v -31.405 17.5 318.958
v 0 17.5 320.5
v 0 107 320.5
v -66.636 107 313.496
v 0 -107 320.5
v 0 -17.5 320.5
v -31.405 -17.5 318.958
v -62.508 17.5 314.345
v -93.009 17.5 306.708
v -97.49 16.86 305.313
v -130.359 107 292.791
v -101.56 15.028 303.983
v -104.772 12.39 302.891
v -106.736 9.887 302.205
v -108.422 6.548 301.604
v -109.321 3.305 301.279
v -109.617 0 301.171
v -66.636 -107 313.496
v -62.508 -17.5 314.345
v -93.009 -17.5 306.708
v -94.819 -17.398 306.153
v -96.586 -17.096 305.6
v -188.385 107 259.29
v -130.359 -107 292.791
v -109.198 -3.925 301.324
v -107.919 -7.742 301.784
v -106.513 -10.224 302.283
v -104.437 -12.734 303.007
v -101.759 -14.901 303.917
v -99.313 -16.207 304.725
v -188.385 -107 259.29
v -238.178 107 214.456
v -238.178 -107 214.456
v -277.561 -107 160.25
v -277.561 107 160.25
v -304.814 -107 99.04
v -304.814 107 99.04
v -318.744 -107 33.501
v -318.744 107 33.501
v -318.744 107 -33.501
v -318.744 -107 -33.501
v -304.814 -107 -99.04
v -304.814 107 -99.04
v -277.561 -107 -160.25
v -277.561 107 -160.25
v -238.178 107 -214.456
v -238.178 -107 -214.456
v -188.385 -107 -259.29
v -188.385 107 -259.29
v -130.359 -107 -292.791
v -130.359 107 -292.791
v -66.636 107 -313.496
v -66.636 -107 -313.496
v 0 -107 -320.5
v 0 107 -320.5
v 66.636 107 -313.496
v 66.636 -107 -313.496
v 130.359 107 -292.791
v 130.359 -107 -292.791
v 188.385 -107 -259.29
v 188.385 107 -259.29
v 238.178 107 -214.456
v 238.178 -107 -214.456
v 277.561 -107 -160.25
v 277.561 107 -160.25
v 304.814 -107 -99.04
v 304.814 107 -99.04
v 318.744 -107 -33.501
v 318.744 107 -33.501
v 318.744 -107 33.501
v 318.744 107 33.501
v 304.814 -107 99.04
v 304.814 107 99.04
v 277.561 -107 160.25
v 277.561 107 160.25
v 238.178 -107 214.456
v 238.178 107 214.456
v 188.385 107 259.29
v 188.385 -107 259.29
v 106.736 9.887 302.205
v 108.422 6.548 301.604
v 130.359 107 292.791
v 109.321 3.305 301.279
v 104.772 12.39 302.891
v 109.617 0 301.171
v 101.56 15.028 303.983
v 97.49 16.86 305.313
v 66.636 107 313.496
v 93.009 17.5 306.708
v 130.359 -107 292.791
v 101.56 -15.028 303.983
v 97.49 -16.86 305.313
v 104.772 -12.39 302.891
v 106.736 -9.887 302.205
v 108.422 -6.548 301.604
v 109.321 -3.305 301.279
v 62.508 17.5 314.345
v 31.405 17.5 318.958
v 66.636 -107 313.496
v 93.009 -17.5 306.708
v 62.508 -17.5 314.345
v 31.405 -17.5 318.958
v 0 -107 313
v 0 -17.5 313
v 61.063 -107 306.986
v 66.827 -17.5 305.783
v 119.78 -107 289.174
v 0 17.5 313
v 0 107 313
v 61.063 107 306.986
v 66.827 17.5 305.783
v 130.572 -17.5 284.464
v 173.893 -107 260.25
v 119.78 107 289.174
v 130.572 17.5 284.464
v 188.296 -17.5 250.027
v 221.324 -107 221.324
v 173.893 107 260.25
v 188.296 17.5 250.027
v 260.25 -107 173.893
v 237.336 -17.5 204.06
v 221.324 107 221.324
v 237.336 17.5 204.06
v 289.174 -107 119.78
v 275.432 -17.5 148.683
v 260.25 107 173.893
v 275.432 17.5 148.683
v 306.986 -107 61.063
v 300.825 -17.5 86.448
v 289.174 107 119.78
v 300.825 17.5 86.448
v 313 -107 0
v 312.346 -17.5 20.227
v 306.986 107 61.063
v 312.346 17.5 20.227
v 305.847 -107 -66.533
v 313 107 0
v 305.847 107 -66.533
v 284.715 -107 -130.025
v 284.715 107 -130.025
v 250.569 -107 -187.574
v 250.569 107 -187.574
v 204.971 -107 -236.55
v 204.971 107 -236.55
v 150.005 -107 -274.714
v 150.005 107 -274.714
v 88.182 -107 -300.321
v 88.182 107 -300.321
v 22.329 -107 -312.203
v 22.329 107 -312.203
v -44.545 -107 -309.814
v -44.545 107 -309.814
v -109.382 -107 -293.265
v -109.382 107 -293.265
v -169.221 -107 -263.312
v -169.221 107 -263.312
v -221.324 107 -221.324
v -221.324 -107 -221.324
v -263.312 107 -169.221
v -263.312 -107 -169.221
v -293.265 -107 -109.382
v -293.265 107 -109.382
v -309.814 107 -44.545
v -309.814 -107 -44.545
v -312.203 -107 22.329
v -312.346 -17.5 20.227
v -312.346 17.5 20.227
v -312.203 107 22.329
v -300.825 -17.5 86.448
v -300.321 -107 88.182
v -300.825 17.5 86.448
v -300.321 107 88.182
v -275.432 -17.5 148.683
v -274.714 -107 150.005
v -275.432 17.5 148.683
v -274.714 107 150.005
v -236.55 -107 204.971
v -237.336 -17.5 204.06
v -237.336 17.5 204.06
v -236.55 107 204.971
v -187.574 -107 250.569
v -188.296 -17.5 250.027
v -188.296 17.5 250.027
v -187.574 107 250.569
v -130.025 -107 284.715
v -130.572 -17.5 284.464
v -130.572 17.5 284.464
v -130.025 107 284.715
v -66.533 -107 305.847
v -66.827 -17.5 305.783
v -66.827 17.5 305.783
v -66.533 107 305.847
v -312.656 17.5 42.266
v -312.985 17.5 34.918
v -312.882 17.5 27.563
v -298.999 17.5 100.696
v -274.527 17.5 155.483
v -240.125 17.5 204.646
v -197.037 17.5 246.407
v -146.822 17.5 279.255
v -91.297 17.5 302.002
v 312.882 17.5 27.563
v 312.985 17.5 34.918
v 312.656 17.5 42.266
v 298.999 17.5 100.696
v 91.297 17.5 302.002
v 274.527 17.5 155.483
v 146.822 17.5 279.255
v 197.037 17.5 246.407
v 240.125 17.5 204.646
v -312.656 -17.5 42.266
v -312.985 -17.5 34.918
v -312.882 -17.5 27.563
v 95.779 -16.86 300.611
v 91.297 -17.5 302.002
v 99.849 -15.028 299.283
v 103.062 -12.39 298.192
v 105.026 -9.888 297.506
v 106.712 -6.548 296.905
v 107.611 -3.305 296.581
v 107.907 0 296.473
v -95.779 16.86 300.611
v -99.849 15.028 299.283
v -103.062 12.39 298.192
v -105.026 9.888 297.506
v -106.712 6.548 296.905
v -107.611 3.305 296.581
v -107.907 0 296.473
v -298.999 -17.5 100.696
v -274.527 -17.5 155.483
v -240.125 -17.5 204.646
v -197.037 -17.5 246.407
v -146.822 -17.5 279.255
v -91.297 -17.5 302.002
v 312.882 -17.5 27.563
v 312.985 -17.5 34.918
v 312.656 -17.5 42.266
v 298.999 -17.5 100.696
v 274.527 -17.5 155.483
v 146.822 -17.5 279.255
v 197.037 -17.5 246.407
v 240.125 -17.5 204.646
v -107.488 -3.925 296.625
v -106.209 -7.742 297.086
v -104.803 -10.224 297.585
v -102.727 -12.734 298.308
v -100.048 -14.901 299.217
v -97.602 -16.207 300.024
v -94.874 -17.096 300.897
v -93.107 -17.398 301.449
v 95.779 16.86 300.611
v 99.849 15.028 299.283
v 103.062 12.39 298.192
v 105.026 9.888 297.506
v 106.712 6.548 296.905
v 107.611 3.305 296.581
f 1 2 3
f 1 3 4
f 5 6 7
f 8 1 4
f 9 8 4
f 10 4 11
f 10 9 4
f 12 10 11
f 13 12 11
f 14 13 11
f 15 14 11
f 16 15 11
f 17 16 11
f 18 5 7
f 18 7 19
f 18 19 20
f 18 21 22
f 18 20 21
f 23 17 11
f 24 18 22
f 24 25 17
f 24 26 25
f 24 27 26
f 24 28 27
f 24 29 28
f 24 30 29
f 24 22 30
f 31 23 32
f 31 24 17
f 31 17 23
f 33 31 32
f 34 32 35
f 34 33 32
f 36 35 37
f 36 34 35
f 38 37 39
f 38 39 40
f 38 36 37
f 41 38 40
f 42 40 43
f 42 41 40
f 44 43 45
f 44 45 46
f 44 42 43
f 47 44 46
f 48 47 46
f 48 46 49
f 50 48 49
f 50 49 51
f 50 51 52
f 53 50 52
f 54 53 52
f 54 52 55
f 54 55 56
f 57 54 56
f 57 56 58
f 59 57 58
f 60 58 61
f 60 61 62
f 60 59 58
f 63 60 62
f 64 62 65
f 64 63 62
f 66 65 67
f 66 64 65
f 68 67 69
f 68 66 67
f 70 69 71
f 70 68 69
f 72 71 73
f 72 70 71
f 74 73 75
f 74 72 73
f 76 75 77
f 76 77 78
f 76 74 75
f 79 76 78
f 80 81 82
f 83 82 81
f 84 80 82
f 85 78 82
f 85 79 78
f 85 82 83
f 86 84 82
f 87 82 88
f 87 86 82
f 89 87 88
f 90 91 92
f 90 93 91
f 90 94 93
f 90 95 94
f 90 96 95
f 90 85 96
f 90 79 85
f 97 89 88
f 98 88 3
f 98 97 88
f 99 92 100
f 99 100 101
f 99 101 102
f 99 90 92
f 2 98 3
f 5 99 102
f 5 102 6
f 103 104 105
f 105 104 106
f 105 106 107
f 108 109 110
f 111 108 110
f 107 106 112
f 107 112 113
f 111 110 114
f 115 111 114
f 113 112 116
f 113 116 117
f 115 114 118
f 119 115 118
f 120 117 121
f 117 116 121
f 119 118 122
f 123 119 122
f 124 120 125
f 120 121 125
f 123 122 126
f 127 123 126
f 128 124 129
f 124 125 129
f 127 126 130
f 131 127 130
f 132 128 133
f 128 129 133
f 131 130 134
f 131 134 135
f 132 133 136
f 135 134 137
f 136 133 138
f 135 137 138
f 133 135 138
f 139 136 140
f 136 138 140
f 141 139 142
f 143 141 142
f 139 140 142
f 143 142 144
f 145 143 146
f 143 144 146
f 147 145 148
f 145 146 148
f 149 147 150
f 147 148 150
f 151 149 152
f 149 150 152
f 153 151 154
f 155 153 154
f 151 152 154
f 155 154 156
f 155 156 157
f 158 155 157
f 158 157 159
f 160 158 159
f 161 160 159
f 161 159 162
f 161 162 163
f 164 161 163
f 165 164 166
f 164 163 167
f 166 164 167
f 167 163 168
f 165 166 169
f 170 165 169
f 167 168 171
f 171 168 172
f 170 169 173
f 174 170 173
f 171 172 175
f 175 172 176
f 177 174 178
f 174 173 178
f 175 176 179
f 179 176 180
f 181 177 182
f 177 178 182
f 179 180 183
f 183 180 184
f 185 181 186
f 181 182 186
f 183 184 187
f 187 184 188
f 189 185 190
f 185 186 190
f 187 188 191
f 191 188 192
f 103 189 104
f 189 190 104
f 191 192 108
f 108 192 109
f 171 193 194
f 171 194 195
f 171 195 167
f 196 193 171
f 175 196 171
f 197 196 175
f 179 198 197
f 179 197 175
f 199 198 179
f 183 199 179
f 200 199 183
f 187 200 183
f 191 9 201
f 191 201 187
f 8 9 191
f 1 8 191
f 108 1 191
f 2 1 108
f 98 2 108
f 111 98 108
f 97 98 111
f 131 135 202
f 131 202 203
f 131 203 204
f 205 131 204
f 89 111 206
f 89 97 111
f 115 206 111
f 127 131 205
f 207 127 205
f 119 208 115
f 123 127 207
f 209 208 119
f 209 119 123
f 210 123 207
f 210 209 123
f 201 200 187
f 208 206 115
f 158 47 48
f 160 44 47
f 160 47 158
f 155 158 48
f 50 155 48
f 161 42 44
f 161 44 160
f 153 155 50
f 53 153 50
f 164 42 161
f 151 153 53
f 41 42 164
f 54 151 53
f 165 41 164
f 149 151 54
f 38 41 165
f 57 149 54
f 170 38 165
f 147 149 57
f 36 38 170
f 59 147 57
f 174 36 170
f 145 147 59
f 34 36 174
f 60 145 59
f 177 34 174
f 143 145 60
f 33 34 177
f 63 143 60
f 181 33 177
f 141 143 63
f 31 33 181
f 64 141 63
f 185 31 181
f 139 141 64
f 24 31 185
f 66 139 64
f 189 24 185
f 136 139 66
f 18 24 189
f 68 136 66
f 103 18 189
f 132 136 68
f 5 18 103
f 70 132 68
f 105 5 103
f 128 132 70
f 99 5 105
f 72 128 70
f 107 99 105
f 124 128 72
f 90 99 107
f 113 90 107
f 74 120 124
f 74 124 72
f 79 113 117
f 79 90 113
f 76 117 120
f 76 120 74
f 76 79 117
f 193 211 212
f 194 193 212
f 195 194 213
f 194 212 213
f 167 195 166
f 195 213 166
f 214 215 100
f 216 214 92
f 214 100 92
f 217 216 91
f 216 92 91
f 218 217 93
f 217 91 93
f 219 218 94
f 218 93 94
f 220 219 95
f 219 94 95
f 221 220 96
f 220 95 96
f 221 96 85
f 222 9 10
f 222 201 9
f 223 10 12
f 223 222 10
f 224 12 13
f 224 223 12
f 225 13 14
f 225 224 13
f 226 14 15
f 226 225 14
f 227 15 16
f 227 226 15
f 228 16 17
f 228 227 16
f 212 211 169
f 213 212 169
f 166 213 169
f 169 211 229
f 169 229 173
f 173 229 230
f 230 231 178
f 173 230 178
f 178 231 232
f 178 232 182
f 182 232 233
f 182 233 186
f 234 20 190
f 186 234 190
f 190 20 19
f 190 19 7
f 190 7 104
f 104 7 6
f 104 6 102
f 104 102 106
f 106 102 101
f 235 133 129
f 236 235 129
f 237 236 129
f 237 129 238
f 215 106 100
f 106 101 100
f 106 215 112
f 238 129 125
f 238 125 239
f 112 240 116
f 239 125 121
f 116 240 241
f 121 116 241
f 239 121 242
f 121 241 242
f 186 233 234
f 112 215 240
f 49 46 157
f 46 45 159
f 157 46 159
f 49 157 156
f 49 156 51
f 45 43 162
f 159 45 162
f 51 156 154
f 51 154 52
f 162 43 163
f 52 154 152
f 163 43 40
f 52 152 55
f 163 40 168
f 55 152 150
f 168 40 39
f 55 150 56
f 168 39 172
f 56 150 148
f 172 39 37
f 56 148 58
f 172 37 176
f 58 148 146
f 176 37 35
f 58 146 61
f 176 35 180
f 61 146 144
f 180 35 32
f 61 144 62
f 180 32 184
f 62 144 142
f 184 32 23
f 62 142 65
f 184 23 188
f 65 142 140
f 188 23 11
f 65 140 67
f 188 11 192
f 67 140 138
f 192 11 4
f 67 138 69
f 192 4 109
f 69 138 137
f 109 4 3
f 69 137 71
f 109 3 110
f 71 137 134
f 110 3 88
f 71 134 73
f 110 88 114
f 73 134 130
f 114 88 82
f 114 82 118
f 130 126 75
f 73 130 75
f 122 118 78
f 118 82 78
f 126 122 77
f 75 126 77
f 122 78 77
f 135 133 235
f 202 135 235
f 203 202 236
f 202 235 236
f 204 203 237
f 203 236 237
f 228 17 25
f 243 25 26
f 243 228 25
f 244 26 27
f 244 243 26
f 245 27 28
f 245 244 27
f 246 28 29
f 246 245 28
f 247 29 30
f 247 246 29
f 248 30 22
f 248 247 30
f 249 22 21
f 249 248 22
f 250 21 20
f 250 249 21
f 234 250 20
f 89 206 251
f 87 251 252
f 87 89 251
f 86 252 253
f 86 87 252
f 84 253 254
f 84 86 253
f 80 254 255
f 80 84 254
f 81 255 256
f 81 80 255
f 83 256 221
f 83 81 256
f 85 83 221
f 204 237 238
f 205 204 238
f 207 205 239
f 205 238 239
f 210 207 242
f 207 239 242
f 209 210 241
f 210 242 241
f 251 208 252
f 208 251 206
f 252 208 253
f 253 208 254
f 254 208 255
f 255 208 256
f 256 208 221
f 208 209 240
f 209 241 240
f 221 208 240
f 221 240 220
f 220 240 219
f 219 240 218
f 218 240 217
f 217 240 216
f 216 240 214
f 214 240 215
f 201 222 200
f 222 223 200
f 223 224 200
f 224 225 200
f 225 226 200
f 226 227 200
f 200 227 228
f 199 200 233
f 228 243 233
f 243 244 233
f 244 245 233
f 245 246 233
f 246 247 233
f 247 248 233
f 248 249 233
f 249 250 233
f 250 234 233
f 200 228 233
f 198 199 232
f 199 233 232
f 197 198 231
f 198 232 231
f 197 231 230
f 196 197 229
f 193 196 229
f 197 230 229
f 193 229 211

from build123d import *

# Parameters (mm, degrees)
F1_DEPTH = 107
F2_DEPTH = 17.5
F3_R     = 17.49999


# Not quite as in the source:
# - a fillet or chamfer is up to 0.001 mm smaller than in the source, because OpenCascade refuses the exact size


with BuildPart() as f1:
    # F0 (on Front) → F1 (new body, symmetric)
    with BuildSketch(Plane.XZ):
        with BuildLine():
            ThreePointArc((-109.6174559359, 301.1714849619), (-183.8312478505, -262.5382301946), (320.5, 0))
            ThreePointArc((320.5, 0), (262.5382301946, 183.8312478505), (109.6174559359, 301.1714849619))
            Line((109.6174559359, 301.1714849619), (107.9073522021, 296.4730135685))
            ThreePointArc((107.9073522021, 296.4730135685), (245.7106265432, 197.905362326), (312.6560960166, 42.2659444153))
            ThreePointArc((312.6560960166, 42.2659444153), (312.9876062183, 31.2398034738), (312.3457274768, 20.2273707381))
            ThreePointArc((312.3457274768, 20.2273707381), (312.836389108, 10.1189747444), (313, 0))
            ThreePointArc((313, 0), (-10.1189747444, -312.836389108), (-312.3457274768, 20.2273707381))
            ThreePointArc((-312.3457274768, 20.2273707381), (-312.9876062183, 31.2398034738), (-312.6560960166, 42.2659444153))
            ThreePointArc((-312.6560960166, 42.2659444153), (-245.7106265432, 197.905362326), (-107.9073522021, 296.4730135685))
            Line((-107.9073522021, 296.4730135685), (-109.6174559359, 301.1714849619))
        make_face()
        with BuildLine():
            Line((107.9073522021, 296.4730135685), (109.6174559359, 301.1714849619))
            ThreePointArc((109.6174559359, 301.1714849619), (55.6542409422, 315.6308848404), (0, 320.5))
            Line((0, 320.5), (0, 315.4999911785))
            ThreePointArc((0, 315.4999911785), (54.7859985221, 310.7068373879), (107.9073522021, 296.4730135685))
        make_face()
        with BuildLine():
            Line((-107.0523048609, 294.123790306), (-107.9073522021, 296.4730135685))
            ThreePointArc((-107.9073522021, 296.4730135685), (-245.7106265432, 197.905362326), (-312.6560960166, 42.2659444153))
            ThreePointArc((-312.6560960166, 42.2659444153), (-312.9876062183, 31.2398034738), (-312.3457274768, 20.2273707381))
            ThreePointArc((-312.3457274768, 20.2273707381), (-250.4565621924, 187.7245600735), (-107.0523048609, 294.123790306))
        make_face()
        with BuildLine():
            ThreePointArc((0, 320.5), (-55.6542409423, 315.6308848404), (-109.6174559359, 301.1714849619))
            Line((-109.6174559359, 301.1714849619), (-107.9073522021, 296.4730135685))
            ThreePointArc((-107.9073522021, 296.4730135685), (-54.7859985221, 310.7068373879), (0, 315.4999911785))
            Line((0, 315.4999911785), (0, 320.5))
        make_face()
        with BuildLine():
            ThreePointArc((312.6560960166, 42.2659444153), (245.7106265432, 197.905362326), (107.9073522021, 296.4730135685))
            Line((107.9073522021, 296.4730135685), (107.0523048609, 294.123790306))
            ThreePointArc((107.0523048609, 294.123790306), (250.4565621924, 187.7245600735), (312.3457274768, 20.2273707381))
            ThreePointArc((312.3457274768, 20.2273707381), (312.9876062183, 31.2398034738), (312.6560960166, 42.2659444153))
        make_face()
        with BuildLine():
            ThreePointArc((0, 315.4999911785), (-54.7859985221, 310.7068373879), (-107.9073522021, 296.4730135685))
            Line((-107.9073522021, 296.4730135685), (-107.0523048609, 294.123790306))
            ThreePointArc((-107.0523048609, 294.123790306), (-54.3518796098, 308.2448266928), (0, 313))
            Line((0, 313), (0, 315.4999911785))
        make_face()
        with BuildLine():
            Line((107.0523048609, 294.123790306), (107.9073522021, 296.4730135685))
            ThreePointArc((107.9073522021, 296.4730135685), (54.7859985221, 310.7068373879), (0, 315.4999911785))
            Line((0, 315.4999911785), (0, 313))
            ThreePointArc((0, 313), (54.3518796097, 308.2448266928), (107.0523048609, 294.123790306))
        make_face()
    extrude(amount=F1_DEPTH, both=True)

    # F0 (on Front) → F2 (cut, symmetric)
    with BuildSketch(Plane.XZ):
        with BuildLine():
            ThreePointArc((0, 320.5), (-55.6542409423, 315.6308848404), (-109.6174559359, 301.1714849619))
            Line((-109.6174559359, 301.1714849619), (-107.9073522021, 296.4730135685))
            ThreePointArc((-107.9073522021, 296.4730135685), (-54.7859985221, 310.7068373879), (0, 315.4999911785))
            Line((0, 315.4999911785), (0, 320.5))
        make_face()
        with BuildLine():
            Line((107.9073522021, 296.4730135685), (109.6174559359, 301.1714849619))
            ThreePointArc((109.6174559359, 301.1714849619), (55.6542409422, 315.6308848404), (0, 320.5))
            Line((0, 320.5), (0, 315.4999911785))
            ThreePointArc((0, 315.4999911785), (54.7859985221, 310.7068373879), (107.9073522021, 296.4730135685))
        make_face()
        with BuildLine():
            ThreePointArc((0, 315.4999911785), (-54.7859985221, 310.7068373879), (-107.9073522021, 296.4730135685))
            Line((-107.9073522021, 296.4730135685), (-107.0523048609, 294.123790306))
            ThreePointArc((-107.0523048609, 294.123790306), (-54.3518796098, 308.2448266928), (0, 313))
            Line((0, 313), (0, 315.4999911785))
        make_face()
        with BuildLine():
            Line((107.0523048609, 294.123790306), (107.9073522021, 296.4730135685))
            ThreePointArc((107.9073522021, 296.4730135685), (54.7859985221, 310.7068373879), (0, 315.4999911785))
            Line((0, 315.4999911785), (0, 313))
            ThreePointArc((0, 313), (54.3518796097, 308.2448266928), (107.0523048609, 294.123790306))
        make_face()
        with BuildLine():
            Line((-107.0523048609, 294.123790306), (-107.9073522021, 296.4730135685))
            ThreePointArc((-107.9073522021, 296.4730135685), (-245.7106265432, 197.905362326), (-312.6560960166, 42.2659444153))
            ThreePointArc((-312.6560960166, 42.2659444153), (-312.9876062183, 31.2398034738), (-312.3457274768, 20.2273707381))
            ThreePointArc((-312.3457274768, 20.2273707381), (-250.4565621924, 187.7245600735), (-107.0523048609, 294.123790306))
        make_face()
        with BuildLine():
            ThreePointArc((312.6560960166, 42.2659444153), (245.7106265432, 197.905362326), (107.9073522021, 296.4730135685))
            Line((107.9073522021, 296.4730135685), (107.0523048609, 294.123790306))
            ThreePointArc((107.0523048609, 294.123790306), (250.4565621924, 187.7245600735), (312.3457274768, 20.2273707381))
            ThreePointArc((312.3457274768, 20.2273707381), (312.9876062183, 31.2398034738), (312.6560960166, 42.2659444153))
        make_face()
    extrude(amount=F2_DEPTH, both=True, mode=Mode.SUBTRACT)

    # F3 (radius 17.5 in the source; OpenCascade refuses exactly that, so slightly less here)
    f3_edges = [f1.edges().sort_by_distance(p)[0] for p in [
        (-108.762404, 17.5, 298.822249),
        (108.762404, 17.5, 298.822249),
        (-108.762404, -17.5, 298.822249),
        (108.762404, -17.5, 298.822249),
    ]]
    fillet(f3_edges, radius=F3_R)


solid = f1.part
